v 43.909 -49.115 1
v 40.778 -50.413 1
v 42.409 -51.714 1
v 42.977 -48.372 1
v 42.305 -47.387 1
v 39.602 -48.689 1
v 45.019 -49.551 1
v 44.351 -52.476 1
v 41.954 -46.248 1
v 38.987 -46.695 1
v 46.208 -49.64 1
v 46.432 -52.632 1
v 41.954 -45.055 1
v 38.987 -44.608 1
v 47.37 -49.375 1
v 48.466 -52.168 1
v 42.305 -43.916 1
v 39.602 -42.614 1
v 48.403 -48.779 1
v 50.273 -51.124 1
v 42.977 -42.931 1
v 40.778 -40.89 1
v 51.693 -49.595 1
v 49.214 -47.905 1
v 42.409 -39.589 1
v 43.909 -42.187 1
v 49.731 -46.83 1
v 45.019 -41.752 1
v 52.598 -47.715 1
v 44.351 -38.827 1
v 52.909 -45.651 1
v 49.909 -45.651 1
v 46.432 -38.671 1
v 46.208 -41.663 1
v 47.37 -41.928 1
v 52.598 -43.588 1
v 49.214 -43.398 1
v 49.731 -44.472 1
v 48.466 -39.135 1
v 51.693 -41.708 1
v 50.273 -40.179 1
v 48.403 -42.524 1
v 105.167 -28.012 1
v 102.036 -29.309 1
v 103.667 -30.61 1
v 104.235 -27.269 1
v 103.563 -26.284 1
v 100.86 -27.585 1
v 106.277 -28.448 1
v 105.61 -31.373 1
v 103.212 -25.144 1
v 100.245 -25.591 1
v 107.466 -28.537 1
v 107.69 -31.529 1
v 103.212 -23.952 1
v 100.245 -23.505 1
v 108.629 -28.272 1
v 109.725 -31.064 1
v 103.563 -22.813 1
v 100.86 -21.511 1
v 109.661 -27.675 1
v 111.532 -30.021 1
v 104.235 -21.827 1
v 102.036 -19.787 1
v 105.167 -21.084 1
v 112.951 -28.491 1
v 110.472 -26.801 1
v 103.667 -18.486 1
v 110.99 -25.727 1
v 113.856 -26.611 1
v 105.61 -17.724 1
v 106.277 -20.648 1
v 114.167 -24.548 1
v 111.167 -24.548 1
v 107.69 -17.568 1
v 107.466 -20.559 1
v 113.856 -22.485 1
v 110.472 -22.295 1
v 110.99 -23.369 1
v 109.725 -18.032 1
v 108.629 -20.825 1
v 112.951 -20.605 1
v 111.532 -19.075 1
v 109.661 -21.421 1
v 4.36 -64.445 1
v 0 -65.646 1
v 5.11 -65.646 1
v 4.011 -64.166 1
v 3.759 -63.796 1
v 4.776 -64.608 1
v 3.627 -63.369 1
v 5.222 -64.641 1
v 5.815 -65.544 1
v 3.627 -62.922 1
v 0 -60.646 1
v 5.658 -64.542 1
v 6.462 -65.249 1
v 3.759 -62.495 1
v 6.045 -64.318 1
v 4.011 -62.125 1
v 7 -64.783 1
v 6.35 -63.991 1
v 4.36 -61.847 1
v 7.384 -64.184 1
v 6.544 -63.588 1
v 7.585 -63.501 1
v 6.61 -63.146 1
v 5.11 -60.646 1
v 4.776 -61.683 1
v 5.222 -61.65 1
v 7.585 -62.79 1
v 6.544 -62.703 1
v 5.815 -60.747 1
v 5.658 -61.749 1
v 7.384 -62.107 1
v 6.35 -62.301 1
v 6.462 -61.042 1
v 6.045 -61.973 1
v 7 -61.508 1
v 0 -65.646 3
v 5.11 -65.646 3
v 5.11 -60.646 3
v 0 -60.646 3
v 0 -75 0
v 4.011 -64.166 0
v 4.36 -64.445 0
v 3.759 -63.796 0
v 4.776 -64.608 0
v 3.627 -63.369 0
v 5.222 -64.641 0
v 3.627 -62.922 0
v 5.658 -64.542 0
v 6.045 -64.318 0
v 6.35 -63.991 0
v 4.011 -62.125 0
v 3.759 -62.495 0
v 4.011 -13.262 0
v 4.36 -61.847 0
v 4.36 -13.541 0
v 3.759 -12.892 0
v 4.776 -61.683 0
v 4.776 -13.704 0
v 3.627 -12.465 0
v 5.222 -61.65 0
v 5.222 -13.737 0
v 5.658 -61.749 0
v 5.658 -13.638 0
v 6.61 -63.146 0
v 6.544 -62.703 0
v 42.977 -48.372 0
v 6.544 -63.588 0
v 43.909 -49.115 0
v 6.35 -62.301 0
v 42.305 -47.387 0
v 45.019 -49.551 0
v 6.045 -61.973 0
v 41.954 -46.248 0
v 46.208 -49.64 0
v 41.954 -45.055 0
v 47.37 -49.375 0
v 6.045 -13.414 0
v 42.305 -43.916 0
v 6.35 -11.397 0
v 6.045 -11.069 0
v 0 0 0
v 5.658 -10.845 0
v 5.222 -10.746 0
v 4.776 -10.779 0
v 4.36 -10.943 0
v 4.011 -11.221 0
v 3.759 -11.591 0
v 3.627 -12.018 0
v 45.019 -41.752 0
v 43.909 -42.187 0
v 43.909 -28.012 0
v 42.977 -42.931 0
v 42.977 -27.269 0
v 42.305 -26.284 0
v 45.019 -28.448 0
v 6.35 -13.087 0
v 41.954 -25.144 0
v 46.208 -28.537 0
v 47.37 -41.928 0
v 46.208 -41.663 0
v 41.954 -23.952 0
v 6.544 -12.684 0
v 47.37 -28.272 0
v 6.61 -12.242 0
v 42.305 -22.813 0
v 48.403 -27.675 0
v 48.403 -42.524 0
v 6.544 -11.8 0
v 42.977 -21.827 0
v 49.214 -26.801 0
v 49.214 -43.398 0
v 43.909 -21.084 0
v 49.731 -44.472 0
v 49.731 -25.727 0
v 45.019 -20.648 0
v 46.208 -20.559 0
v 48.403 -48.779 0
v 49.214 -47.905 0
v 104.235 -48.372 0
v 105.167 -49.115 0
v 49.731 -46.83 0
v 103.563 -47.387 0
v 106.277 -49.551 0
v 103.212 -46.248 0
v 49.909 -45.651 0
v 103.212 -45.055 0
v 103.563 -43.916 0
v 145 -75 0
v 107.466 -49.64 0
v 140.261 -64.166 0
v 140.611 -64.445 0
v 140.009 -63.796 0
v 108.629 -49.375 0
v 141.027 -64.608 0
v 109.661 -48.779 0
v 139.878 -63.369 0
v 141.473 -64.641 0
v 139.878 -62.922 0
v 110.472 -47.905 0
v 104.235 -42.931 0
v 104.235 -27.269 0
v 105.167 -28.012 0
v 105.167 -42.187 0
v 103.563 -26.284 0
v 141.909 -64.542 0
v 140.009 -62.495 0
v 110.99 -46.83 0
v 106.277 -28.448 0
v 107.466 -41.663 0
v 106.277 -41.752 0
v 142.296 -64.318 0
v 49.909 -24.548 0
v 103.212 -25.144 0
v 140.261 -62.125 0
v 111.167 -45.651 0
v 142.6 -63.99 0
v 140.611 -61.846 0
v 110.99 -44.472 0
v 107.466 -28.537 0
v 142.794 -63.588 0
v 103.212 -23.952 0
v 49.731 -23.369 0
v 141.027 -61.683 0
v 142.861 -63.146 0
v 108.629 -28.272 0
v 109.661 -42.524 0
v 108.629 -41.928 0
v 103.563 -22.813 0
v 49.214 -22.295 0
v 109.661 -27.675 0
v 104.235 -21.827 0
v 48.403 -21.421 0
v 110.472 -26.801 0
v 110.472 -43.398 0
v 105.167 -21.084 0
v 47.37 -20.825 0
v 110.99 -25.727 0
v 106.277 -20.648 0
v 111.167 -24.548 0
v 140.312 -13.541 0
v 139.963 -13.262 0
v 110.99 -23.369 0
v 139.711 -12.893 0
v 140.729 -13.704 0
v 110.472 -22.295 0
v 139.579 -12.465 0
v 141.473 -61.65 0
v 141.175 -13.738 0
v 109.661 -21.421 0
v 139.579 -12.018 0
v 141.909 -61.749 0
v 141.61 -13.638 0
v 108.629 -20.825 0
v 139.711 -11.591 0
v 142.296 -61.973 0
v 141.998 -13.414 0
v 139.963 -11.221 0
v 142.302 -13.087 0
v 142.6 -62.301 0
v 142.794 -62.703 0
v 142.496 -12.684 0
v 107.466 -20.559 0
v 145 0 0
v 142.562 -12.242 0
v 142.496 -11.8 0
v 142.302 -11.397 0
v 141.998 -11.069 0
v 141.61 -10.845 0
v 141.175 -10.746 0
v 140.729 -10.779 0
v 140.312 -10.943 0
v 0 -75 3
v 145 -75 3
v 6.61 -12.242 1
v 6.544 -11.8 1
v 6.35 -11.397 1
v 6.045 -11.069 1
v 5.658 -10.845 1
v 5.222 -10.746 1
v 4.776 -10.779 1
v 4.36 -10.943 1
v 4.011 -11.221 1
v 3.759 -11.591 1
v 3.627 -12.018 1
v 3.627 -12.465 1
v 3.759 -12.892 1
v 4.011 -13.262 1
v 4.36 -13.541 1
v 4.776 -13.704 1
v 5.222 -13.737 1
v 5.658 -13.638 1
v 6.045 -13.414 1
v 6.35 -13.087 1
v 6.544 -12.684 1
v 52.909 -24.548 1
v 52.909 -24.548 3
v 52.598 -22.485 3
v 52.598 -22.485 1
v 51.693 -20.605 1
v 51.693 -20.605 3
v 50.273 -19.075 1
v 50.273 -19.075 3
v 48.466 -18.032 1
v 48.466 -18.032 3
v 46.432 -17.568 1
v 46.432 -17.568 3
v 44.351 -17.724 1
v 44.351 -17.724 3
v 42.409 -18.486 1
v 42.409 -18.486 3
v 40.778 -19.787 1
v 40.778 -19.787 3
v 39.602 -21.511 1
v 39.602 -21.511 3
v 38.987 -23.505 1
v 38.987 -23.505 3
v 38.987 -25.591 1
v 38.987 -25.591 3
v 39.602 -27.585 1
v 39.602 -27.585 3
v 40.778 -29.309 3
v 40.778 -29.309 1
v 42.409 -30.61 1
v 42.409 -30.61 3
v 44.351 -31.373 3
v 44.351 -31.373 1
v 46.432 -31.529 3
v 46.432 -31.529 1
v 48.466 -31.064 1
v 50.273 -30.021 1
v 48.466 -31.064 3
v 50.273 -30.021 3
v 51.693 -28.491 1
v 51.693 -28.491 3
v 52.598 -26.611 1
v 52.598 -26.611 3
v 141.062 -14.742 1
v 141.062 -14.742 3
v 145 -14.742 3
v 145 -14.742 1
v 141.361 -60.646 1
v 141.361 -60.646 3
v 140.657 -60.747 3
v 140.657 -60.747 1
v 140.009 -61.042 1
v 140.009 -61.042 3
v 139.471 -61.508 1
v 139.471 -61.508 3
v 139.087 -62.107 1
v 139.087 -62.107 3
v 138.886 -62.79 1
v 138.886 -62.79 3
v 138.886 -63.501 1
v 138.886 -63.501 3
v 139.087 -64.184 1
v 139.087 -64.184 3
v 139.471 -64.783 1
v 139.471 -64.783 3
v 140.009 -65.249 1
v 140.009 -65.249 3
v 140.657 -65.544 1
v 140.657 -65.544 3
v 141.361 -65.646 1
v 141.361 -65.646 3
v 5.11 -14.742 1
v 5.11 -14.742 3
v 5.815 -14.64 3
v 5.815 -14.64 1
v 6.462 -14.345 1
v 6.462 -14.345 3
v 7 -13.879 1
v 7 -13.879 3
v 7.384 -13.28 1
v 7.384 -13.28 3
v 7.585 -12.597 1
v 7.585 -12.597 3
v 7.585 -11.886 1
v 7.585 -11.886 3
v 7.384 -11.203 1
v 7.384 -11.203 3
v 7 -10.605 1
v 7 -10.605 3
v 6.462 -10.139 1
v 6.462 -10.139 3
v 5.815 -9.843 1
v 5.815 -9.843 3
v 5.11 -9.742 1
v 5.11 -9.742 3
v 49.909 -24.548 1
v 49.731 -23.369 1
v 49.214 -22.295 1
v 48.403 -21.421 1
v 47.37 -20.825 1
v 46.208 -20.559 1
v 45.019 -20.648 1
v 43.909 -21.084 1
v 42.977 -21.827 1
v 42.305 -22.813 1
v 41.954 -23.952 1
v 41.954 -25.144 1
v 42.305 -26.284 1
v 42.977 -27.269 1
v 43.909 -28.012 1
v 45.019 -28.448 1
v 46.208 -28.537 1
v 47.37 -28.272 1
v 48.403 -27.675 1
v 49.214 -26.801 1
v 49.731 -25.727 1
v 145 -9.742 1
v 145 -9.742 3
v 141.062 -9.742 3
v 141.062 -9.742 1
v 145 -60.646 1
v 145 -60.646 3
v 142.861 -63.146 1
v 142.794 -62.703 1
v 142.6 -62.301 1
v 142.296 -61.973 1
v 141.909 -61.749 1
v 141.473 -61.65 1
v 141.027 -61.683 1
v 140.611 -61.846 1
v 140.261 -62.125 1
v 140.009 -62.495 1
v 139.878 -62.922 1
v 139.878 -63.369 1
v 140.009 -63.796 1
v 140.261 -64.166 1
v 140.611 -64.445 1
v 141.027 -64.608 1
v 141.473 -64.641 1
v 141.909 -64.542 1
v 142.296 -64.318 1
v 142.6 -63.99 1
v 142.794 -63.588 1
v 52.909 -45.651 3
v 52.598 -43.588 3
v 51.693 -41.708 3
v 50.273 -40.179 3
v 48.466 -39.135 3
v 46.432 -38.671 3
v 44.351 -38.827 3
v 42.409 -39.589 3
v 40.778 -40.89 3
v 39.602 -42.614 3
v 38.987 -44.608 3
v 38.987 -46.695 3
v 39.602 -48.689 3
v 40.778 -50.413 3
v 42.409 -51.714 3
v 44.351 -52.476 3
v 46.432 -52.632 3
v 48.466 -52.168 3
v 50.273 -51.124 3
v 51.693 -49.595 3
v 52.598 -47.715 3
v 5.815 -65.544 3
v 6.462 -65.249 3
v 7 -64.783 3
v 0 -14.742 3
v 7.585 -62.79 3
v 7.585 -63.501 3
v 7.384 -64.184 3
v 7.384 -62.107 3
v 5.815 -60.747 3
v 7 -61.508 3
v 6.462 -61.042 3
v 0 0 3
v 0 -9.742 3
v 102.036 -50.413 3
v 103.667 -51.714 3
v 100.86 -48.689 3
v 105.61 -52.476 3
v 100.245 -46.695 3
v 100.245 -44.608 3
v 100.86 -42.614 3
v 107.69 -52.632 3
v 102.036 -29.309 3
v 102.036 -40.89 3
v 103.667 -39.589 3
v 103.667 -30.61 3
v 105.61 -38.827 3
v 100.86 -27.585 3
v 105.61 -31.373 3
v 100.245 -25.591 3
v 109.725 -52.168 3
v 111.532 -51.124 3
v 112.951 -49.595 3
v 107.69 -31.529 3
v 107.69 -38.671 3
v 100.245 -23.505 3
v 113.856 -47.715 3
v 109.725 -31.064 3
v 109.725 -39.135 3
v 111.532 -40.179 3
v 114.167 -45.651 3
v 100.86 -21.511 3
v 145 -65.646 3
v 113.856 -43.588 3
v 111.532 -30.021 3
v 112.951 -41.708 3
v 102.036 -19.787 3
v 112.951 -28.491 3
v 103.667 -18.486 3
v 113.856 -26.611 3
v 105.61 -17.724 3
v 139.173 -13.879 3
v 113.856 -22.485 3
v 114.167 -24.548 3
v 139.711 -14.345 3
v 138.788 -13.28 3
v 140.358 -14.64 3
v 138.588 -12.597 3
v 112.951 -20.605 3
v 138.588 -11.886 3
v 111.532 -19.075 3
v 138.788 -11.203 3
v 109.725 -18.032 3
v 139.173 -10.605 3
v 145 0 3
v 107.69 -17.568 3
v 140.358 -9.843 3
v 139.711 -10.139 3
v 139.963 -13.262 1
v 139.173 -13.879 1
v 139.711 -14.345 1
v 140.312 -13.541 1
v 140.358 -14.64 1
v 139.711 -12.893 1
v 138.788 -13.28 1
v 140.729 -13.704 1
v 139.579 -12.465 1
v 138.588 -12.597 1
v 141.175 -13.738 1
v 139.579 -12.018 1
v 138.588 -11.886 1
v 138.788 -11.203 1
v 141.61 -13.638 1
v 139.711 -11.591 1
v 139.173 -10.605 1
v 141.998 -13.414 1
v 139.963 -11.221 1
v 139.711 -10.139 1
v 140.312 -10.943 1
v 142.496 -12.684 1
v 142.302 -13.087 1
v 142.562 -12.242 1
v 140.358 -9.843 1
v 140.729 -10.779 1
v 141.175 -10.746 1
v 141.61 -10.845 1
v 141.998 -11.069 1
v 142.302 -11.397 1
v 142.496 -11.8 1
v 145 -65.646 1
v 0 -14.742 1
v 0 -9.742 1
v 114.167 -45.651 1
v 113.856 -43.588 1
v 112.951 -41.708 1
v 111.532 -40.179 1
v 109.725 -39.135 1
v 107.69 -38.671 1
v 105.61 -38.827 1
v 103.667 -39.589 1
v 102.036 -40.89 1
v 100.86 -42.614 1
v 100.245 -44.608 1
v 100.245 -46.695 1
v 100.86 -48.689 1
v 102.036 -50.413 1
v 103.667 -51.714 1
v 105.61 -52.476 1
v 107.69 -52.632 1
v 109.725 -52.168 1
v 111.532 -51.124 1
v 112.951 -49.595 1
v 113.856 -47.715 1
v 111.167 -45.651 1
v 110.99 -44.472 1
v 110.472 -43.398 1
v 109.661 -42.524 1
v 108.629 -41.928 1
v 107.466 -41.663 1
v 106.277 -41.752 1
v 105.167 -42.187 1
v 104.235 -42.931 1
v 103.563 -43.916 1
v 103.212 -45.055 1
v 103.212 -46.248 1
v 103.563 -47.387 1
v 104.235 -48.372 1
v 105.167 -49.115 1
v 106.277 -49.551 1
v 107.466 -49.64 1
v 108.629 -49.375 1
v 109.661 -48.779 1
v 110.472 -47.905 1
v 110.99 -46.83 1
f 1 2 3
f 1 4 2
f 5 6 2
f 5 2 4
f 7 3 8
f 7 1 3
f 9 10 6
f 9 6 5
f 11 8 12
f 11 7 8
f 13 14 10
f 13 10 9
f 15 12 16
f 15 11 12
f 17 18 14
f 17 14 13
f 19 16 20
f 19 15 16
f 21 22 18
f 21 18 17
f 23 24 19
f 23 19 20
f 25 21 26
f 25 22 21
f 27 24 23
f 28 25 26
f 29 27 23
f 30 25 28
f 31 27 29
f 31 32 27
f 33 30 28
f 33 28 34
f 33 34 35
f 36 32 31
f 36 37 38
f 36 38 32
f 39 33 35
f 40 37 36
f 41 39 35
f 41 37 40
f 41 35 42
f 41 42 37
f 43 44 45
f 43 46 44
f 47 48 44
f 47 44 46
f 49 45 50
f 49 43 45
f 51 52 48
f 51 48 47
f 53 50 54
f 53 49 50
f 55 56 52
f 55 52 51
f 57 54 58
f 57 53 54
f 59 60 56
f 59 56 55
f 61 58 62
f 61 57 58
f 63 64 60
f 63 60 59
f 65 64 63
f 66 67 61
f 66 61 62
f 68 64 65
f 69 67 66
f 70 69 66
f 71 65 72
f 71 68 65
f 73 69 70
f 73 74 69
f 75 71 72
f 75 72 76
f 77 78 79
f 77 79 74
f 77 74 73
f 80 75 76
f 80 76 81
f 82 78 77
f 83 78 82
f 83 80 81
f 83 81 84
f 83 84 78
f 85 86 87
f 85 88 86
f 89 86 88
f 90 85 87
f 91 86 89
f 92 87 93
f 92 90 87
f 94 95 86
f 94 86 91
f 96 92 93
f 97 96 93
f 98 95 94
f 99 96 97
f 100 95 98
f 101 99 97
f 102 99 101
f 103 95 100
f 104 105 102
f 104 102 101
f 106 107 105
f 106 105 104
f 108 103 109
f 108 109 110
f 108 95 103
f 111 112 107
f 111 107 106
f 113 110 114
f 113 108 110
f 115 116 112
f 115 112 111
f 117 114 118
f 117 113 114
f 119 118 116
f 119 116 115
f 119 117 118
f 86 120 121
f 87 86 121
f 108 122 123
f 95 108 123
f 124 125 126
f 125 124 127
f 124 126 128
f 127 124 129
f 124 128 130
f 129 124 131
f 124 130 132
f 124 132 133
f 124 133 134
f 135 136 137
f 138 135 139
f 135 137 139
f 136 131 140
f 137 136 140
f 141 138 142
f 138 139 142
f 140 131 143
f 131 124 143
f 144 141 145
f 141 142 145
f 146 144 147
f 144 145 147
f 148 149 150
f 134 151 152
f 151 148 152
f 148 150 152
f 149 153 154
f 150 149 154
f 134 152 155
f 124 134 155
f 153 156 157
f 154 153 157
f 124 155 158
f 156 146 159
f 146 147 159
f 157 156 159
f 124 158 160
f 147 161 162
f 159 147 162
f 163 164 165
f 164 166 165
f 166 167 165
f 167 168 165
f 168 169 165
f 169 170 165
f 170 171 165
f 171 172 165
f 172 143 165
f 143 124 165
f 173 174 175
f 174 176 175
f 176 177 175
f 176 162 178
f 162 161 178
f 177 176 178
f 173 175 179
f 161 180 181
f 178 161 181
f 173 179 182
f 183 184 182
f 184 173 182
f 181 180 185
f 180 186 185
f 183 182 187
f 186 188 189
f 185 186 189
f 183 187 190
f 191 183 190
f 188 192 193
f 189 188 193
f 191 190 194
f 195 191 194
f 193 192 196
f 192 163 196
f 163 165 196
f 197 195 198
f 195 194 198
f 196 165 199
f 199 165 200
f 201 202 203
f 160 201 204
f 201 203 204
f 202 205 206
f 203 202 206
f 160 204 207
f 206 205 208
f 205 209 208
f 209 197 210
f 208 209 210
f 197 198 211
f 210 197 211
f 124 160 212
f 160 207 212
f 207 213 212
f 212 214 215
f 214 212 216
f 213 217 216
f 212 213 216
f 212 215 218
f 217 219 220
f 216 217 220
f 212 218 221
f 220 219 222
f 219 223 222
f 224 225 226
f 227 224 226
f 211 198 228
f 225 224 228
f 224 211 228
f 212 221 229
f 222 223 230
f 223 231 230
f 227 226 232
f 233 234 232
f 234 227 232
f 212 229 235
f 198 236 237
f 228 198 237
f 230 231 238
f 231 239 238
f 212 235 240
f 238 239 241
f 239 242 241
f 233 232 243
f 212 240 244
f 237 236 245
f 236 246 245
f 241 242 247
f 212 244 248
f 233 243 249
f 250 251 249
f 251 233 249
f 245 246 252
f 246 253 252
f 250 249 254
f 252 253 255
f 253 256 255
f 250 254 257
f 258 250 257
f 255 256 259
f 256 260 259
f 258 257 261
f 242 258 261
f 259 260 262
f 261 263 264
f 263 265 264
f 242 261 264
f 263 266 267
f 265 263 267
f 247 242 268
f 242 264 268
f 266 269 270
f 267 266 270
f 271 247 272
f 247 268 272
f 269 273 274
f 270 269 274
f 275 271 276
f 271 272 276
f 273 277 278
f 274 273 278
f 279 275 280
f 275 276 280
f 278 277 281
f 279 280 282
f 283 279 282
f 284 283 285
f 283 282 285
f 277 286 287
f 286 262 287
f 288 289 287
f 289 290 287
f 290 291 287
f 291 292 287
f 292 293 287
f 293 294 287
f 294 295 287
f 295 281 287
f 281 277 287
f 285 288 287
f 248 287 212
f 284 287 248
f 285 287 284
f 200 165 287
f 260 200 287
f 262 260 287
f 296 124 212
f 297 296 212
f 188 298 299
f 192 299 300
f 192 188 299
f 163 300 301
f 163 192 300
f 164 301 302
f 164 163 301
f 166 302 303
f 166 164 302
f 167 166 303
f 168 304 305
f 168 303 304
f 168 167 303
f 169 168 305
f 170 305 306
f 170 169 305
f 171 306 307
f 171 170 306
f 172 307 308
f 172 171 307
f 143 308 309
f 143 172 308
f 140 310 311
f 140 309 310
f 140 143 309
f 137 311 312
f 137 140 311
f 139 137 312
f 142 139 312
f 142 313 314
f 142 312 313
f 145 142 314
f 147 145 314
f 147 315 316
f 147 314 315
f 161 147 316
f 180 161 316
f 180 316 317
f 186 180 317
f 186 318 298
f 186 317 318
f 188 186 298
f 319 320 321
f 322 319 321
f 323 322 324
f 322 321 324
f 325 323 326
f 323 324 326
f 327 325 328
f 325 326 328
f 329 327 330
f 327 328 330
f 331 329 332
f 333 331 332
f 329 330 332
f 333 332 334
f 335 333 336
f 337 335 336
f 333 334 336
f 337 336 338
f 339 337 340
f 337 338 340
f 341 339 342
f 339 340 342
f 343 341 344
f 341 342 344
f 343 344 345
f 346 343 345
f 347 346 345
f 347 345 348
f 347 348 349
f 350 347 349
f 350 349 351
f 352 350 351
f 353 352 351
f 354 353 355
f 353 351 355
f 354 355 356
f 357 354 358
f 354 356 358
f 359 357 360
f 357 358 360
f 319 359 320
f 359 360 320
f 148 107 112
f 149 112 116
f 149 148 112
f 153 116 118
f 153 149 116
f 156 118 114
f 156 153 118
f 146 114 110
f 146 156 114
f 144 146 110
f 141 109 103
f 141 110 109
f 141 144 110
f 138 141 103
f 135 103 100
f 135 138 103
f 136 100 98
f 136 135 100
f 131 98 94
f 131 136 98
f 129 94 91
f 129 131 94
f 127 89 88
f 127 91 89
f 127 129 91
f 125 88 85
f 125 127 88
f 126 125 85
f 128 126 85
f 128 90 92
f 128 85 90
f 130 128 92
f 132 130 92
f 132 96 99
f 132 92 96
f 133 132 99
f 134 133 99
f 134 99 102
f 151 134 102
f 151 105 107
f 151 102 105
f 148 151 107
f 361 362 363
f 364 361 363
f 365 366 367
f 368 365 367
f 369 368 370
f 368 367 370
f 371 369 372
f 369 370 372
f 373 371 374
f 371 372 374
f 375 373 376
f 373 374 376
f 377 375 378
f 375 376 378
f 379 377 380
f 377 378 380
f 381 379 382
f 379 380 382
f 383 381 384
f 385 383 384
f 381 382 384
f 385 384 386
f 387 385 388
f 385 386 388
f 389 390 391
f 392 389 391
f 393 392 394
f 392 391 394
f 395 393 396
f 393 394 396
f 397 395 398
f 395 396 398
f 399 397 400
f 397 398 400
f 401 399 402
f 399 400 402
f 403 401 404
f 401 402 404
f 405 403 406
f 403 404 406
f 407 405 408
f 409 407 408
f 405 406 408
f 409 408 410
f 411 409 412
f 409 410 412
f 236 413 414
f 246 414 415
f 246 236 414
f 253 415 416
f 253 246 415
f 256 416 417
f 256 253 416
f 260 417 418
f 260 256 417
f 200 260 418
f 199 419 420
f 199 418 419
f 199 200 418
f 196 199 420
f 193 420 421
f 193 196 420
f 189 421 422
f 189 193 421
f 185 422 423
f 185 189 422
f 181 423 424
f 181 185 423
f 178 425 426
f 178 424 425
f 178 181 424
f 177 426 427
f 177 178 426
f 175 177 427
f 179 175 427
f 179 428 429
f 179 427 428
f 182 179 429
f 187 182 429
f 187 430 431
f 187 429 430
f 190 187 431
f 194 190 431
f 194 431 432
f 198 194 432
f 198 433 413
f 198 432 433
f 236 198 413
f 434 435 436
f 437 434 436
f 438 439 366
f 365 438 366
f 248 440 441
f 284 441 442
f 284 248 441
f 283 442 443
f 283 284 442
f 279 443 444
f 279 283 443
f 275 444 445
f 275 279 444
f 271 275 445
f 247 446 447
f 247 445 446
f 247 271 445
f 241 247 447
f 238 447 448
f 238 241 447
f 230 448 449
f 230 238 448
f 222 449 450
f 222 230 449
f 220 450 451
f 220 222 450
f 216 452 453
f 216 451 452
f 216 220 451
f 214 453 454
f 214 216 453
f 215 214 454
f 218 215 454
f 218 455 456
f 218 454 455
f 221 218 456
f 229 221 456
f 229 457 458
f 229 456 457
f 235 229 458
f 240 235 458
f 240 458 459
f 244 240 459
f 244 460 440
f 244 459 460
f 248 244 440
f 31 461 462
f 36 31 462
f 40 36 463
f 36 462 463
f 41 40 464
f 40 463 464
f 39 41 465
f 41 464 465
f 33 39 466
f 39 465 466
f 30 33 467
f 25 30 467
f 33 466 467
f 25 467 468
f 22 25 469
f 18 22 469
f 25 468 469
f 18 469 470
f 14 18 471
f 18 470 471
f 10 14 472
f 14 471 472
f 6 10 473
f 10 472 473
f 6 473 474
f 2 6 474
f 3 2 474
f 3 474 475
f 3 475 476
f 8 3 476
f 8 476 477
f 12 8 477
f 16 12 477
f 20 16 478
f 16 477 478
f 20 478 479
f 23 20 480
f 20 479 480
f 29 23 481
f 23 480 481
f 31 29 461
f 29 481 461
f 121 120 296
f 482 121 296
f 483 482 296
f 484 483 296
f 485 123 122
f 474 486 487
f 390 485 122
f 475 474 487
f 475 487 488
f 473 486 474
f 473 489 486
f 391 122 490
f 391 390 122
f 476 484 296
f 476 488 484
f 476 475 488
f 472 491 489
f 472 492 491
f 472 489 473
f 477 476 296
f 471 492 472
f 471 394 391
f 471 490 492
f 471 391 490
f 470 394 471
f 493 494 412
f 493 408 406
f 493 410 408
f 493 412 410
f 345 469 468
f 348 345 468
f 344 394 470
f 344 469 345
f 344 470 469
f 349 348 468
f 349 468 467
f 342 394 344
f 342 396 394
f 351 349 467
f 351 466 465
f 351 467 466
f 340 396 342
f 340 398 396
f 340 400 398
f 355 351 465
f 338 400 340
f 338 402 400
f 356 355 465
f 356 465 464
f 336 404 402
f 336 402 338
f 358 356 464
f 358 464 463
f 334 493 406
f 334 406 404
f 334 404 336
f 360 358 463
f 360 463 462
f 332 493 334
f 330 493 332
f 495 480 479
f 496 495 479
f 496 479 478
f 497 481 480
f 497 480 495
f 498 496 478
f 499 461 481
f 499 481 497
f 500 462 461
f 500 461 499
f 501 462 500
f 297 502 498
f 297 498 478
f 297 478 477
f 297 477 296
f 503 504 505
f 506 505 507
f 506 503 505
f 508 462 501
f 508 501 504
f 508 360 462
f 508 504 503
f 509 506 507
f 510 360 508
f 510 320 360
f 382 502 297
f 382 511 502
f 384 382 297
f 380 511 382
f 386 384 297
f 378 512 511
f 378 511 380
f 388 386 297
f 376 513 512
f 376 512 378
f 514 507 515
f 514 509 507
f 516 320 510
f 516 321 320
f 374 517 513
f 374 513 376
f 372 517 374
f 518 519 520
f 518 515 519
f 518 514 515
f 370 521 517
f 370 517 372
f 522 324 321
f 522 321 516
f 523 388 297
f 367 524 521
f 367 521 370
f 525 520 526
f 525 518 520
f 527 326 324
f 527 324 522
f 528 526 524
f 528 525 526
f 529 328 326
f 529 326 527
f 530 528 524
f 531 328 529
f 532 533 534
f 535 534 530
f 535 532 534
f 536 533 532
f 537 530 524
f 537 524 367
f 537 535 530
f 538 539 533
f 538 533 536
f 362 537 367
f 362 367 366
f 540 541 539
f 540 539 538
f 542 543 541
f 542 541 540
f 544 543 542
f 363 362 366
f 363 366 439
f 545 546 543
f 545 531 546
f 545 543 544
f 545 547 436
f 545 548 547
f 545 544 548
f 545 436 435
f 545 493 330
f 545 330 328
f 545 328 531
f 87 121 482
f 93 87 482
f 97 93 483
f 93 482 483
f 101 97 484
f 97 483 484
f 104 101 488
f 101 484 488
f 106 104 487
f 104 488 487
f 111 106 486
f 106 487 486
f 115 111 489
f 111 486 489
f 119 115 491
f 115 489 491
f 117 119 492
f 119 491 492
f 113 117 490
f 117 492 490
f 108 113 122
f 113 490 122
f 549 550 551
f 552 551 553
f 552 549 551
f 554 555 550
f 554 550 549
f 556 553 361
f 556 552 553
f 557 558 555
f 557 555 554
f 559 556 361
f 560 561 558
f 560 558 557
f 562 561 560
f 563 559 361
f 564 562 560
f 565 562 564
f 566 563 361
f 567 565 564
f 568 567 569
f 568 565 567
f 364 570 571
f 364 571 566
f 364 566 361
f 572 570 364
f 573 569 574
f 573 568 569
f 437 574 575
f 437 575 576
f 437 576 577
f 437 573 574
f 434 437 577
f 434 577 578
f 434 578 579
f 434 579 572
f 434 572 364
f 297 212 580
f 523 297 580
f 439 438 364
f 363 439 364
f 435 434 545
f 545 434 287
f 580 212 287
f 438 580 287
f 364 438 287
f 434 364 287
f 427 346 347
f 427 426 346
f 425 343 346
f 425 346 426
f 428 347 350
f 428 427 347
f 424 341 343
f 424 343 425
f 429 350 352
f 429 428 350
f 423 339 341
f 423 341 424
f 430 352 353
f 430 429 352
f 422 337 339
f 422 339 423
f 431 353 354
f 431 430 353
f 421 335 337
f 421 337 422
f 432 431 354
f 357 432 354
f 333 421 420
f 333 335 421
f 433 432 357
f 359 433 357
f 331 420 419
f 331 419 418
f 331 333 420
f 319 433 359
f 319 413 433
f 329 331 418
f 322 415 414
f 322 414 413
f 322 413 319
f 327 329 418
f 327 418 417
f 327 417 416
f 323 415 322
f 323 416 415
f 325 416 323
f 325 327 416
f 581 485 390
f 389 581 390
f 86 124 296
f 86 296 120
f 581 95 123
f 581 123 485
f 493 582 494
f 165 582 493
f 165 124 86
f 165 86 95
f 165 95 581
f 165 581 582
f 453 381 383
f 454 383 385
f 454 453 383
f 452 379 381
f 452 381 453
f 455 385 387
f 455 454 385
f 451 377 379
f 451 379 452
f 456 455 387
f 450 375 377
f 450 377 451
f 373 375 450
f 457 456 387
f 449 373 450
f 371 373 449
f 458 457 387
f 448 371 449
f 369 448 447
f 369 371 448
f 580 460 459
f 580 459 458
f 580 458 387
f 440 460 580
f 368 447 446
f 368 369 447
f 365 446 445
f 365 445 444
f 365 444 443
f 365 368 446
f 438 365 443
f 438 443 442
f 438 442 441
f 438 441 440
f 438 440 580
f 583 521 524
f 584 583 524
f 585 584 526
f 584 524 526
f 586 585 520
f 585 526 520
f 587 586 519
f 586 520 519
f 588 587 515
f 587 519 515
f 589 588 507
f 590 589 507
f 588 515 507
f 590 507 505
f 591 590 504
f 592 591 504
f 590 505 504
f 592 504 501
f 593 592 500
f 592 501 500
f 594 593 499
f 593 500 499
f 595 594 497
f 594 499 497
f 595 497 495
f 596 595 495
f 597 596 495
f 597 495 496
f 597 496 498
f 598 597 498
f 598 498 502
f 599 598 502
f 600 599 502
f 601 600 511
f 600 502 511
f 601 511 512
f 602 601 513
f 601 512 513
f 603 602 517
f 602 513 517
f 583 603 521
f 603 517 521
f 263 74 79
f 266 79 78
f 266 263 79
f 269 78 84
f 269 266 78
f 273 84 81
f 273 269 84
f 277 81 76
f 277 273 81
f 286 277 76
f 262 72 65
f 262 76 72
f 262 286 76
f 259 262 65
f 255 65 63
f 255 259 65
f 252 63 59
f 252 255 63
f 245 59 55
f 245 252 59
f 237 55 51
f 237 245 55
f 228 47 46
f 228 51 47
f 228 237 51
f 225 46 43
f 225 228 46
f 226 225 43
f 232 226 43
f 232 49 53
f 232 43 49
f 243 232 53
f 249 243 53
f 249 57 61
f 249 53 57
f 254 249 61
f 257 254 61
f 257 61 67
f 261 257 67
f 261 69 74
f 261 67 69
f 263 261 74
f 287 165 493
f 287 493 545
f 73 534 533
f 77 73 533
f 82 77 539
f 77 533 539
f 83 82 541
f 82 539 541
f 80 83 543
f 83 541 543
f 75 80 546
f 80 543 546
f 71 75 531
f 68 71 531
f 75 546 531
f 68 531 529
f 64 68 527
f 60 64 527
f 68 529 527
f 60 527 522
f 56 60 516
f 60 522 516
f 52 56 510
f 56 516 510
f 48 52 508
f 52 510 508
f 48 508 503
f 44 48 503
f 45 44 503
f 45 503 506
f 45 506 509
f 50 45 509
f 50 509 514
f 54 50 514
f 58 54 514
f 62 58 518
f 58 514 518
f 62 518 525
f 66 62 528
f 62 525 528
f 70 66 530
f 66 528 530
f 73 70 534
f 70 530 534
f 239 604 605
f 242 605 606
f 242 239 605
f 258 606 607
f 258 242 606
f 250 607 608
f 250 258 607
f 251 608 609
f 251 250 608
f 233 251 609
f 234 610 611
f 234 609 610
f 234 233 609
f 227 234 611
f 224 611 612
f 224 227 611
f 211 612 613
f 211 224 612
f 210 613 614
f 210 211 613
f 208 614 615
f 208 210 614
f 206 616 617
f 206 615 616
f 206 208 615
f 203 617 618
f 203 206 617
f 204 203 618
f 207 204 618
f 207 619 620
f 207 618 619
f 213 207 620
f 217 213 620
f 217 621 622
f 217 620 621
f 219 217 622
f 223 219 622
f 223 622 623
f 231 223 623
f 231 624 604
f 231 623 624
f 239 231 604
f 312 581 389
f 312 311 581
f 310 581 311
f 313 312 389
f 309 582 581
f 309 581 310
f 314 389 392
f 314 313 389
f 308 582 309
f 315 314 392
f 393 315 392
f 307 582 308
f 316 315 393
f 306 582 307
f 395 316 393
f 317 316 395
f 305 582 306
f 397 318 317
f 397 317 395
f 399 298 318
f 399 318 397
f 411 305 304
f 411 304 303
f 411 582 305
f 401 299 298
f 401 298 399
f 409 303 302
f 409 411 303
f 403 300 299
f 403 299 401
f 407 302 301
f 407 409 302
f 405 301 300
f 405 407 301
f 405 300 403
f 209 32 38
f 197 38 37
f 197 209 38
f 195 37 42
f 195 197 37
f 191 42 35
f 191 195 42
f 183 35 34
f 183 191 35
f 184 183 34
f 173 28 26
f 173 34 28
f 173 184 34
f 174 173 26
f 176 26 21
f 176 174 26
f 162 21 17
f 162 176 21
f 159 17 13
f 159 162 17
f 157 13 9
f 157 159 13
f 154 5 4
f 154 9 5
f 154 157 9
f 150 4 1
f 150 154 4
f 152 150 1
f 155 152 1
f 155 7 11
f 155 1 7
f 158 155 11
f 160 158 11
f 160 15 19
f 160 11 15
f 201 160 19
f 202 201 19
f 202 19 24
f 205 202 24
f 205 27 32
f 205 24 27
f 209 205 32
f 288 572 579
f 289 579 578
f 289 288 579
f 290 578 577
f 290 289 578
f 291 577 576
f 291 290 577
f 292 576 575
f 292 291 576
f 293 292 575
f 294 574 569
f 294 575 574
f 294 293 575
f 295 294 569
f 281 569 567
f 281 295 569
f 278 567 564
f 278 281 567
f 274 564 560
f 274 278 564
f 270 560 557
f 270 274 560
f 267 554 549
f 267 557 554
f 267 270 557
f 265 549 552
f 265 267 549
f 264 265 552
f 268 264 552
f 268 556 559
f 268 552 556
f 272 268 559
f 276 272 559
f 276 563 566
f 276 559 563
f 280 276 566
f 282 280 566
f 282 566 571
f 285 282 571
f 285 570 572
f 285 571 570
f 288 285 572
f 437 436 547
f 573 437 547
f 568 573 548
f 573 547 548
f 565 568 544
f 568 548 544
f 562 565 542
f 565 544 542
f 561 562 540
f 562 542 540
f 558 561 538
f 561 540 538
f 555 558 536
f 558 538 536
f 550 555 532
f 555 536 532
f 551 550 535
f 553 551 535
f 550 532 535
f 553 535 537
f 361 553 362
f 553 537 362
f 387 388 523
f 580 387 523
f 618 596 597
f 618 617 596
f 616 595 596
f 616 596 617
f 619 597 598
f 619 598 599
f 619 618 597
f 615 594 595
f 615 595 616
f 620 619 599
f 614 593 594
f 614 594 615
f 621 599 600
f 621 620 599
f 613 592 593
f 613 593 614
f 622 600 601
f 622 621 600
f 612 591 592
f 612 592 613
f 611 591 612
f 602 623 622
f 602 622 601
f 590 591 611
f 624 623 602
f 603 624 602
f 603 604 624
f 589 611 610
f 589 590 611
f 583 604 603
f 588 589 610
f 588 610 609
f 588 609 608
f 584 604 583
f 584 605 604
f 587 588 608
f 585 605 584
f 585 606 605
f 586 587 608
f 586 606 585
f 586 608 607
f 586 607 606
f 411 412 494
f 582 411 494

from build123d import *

# Parameters (mm, degrees)
F0_W     = 145
F0_H     = 75
F0_R     = 1.5
F0_R_2   = 4
F1_DEPTH = 3
F2_R     = 7
F3_DEPTH = 2


with BuildPart() as f1:
    # F0 (on Top) → F1 (new body)
    with BuildSketch(Plane.XY):
        with Locations((72.5, -37.5)):
            Rectangle(F0_W, F0_H)
        with Locations((5.110198, -63.145563)):
            Circle(F0_R, mode=Mode.SUBTRACT)
        with Locations((45.909047, -45.651395)):
            Circle(F0_R_2, mode=Mode.SUBTRACT)
        with Locations((141.360894, -63.145511)):
            Circle(F0_R, mode=Mode.SUBTRACT)
        with Locations((107.167281, -45.651395)):
            Circle(F0_R_2, mode=Mode.SUBTRACT)
        with Locations((45.909047, -24.54808)):
            Circle(F0_R_2, mode=Mode.SUBTRACT)
        with Locations((5.110172, -12.241635)):
            Circle(F0_R, mode=Mode.SUBTRACT)
        with Locations((107.167281, -24.54808)):
            Circle(F0_R_2, mode=Mode.SUBTRACT)
        with Locations((141.062453, -12.241724)):
            Circle(F0_R, mode=Mode.SUBTRACT)
    extrude(amount=F1_DEPTH)

    # F2 (on face) → F3 (cut)
    with BuildSketch(Plane.XY.offset(3)):
        with BuildLine():
            Line((-4.892084, -14.741702), (5.110175, -14.741702))
            ThreePointArc((5.110175, -14.741702), (7.610175, -12.241702), (5.110175, -9.741702))
            Line((5.110175, -9.741702), (-4.892084, -9.741702))
            Line((-4.892084, -9.741702), (-4.892084, -14.741702))
        make_face()
        with BuildLine():
            Line((-4.892084, -65.645501), (5.110175, -65.645501))
            ThreePointArc((5.110175, -65.645501), (7.610175, -63.145501), (5.110175, -60.645501))
            Line((5.110175, -60.645501), (-4.892084, -60.645501))
            Line((-4.892084, -60.645501), (-4.892084, -65.645501))
        make_face()
        with BuildLine():
            Line((149.460912, -9.741702), (141.062498, -9.741702))
            ThreePointArc((141.062498, -9.741702), (138.562498, -12.241702), (141.062498, -14.741702))
            Line((141.062498, -14.741702), (149.460912, -14.741702))
            Line((149.460912, -14.741702), (149.460912, -9.741702))
        make_face()
        with BuildLine():
            Line((150.567517, -60.645501), (141.360864, -60.645501))
            ThreePointArc((141.360864, -60.645501), (138.860864, -63.145501), (141.360864, -65.645501))
            Line((141.360864, -65.645501), (150.567517, -65.645501))
            Line((150.567517, -65.645501), (150.567517, -60.645501))
        make_face()
        with Locations((45.909047, -24.54808)):
            Circle(F2_R)
        with Locations((45.909047, -45.651395)):
            Circle(F2_R)
        with Locations((107.167281, -24.54808)):
            Circle(F2_R)
        with Locations((107.167281, -45.651395)):
            Circle(F2_R)
    extrude(amount=-F3_DEPTH, mode=Mode.SUBTRACT)


solid = f1.part
